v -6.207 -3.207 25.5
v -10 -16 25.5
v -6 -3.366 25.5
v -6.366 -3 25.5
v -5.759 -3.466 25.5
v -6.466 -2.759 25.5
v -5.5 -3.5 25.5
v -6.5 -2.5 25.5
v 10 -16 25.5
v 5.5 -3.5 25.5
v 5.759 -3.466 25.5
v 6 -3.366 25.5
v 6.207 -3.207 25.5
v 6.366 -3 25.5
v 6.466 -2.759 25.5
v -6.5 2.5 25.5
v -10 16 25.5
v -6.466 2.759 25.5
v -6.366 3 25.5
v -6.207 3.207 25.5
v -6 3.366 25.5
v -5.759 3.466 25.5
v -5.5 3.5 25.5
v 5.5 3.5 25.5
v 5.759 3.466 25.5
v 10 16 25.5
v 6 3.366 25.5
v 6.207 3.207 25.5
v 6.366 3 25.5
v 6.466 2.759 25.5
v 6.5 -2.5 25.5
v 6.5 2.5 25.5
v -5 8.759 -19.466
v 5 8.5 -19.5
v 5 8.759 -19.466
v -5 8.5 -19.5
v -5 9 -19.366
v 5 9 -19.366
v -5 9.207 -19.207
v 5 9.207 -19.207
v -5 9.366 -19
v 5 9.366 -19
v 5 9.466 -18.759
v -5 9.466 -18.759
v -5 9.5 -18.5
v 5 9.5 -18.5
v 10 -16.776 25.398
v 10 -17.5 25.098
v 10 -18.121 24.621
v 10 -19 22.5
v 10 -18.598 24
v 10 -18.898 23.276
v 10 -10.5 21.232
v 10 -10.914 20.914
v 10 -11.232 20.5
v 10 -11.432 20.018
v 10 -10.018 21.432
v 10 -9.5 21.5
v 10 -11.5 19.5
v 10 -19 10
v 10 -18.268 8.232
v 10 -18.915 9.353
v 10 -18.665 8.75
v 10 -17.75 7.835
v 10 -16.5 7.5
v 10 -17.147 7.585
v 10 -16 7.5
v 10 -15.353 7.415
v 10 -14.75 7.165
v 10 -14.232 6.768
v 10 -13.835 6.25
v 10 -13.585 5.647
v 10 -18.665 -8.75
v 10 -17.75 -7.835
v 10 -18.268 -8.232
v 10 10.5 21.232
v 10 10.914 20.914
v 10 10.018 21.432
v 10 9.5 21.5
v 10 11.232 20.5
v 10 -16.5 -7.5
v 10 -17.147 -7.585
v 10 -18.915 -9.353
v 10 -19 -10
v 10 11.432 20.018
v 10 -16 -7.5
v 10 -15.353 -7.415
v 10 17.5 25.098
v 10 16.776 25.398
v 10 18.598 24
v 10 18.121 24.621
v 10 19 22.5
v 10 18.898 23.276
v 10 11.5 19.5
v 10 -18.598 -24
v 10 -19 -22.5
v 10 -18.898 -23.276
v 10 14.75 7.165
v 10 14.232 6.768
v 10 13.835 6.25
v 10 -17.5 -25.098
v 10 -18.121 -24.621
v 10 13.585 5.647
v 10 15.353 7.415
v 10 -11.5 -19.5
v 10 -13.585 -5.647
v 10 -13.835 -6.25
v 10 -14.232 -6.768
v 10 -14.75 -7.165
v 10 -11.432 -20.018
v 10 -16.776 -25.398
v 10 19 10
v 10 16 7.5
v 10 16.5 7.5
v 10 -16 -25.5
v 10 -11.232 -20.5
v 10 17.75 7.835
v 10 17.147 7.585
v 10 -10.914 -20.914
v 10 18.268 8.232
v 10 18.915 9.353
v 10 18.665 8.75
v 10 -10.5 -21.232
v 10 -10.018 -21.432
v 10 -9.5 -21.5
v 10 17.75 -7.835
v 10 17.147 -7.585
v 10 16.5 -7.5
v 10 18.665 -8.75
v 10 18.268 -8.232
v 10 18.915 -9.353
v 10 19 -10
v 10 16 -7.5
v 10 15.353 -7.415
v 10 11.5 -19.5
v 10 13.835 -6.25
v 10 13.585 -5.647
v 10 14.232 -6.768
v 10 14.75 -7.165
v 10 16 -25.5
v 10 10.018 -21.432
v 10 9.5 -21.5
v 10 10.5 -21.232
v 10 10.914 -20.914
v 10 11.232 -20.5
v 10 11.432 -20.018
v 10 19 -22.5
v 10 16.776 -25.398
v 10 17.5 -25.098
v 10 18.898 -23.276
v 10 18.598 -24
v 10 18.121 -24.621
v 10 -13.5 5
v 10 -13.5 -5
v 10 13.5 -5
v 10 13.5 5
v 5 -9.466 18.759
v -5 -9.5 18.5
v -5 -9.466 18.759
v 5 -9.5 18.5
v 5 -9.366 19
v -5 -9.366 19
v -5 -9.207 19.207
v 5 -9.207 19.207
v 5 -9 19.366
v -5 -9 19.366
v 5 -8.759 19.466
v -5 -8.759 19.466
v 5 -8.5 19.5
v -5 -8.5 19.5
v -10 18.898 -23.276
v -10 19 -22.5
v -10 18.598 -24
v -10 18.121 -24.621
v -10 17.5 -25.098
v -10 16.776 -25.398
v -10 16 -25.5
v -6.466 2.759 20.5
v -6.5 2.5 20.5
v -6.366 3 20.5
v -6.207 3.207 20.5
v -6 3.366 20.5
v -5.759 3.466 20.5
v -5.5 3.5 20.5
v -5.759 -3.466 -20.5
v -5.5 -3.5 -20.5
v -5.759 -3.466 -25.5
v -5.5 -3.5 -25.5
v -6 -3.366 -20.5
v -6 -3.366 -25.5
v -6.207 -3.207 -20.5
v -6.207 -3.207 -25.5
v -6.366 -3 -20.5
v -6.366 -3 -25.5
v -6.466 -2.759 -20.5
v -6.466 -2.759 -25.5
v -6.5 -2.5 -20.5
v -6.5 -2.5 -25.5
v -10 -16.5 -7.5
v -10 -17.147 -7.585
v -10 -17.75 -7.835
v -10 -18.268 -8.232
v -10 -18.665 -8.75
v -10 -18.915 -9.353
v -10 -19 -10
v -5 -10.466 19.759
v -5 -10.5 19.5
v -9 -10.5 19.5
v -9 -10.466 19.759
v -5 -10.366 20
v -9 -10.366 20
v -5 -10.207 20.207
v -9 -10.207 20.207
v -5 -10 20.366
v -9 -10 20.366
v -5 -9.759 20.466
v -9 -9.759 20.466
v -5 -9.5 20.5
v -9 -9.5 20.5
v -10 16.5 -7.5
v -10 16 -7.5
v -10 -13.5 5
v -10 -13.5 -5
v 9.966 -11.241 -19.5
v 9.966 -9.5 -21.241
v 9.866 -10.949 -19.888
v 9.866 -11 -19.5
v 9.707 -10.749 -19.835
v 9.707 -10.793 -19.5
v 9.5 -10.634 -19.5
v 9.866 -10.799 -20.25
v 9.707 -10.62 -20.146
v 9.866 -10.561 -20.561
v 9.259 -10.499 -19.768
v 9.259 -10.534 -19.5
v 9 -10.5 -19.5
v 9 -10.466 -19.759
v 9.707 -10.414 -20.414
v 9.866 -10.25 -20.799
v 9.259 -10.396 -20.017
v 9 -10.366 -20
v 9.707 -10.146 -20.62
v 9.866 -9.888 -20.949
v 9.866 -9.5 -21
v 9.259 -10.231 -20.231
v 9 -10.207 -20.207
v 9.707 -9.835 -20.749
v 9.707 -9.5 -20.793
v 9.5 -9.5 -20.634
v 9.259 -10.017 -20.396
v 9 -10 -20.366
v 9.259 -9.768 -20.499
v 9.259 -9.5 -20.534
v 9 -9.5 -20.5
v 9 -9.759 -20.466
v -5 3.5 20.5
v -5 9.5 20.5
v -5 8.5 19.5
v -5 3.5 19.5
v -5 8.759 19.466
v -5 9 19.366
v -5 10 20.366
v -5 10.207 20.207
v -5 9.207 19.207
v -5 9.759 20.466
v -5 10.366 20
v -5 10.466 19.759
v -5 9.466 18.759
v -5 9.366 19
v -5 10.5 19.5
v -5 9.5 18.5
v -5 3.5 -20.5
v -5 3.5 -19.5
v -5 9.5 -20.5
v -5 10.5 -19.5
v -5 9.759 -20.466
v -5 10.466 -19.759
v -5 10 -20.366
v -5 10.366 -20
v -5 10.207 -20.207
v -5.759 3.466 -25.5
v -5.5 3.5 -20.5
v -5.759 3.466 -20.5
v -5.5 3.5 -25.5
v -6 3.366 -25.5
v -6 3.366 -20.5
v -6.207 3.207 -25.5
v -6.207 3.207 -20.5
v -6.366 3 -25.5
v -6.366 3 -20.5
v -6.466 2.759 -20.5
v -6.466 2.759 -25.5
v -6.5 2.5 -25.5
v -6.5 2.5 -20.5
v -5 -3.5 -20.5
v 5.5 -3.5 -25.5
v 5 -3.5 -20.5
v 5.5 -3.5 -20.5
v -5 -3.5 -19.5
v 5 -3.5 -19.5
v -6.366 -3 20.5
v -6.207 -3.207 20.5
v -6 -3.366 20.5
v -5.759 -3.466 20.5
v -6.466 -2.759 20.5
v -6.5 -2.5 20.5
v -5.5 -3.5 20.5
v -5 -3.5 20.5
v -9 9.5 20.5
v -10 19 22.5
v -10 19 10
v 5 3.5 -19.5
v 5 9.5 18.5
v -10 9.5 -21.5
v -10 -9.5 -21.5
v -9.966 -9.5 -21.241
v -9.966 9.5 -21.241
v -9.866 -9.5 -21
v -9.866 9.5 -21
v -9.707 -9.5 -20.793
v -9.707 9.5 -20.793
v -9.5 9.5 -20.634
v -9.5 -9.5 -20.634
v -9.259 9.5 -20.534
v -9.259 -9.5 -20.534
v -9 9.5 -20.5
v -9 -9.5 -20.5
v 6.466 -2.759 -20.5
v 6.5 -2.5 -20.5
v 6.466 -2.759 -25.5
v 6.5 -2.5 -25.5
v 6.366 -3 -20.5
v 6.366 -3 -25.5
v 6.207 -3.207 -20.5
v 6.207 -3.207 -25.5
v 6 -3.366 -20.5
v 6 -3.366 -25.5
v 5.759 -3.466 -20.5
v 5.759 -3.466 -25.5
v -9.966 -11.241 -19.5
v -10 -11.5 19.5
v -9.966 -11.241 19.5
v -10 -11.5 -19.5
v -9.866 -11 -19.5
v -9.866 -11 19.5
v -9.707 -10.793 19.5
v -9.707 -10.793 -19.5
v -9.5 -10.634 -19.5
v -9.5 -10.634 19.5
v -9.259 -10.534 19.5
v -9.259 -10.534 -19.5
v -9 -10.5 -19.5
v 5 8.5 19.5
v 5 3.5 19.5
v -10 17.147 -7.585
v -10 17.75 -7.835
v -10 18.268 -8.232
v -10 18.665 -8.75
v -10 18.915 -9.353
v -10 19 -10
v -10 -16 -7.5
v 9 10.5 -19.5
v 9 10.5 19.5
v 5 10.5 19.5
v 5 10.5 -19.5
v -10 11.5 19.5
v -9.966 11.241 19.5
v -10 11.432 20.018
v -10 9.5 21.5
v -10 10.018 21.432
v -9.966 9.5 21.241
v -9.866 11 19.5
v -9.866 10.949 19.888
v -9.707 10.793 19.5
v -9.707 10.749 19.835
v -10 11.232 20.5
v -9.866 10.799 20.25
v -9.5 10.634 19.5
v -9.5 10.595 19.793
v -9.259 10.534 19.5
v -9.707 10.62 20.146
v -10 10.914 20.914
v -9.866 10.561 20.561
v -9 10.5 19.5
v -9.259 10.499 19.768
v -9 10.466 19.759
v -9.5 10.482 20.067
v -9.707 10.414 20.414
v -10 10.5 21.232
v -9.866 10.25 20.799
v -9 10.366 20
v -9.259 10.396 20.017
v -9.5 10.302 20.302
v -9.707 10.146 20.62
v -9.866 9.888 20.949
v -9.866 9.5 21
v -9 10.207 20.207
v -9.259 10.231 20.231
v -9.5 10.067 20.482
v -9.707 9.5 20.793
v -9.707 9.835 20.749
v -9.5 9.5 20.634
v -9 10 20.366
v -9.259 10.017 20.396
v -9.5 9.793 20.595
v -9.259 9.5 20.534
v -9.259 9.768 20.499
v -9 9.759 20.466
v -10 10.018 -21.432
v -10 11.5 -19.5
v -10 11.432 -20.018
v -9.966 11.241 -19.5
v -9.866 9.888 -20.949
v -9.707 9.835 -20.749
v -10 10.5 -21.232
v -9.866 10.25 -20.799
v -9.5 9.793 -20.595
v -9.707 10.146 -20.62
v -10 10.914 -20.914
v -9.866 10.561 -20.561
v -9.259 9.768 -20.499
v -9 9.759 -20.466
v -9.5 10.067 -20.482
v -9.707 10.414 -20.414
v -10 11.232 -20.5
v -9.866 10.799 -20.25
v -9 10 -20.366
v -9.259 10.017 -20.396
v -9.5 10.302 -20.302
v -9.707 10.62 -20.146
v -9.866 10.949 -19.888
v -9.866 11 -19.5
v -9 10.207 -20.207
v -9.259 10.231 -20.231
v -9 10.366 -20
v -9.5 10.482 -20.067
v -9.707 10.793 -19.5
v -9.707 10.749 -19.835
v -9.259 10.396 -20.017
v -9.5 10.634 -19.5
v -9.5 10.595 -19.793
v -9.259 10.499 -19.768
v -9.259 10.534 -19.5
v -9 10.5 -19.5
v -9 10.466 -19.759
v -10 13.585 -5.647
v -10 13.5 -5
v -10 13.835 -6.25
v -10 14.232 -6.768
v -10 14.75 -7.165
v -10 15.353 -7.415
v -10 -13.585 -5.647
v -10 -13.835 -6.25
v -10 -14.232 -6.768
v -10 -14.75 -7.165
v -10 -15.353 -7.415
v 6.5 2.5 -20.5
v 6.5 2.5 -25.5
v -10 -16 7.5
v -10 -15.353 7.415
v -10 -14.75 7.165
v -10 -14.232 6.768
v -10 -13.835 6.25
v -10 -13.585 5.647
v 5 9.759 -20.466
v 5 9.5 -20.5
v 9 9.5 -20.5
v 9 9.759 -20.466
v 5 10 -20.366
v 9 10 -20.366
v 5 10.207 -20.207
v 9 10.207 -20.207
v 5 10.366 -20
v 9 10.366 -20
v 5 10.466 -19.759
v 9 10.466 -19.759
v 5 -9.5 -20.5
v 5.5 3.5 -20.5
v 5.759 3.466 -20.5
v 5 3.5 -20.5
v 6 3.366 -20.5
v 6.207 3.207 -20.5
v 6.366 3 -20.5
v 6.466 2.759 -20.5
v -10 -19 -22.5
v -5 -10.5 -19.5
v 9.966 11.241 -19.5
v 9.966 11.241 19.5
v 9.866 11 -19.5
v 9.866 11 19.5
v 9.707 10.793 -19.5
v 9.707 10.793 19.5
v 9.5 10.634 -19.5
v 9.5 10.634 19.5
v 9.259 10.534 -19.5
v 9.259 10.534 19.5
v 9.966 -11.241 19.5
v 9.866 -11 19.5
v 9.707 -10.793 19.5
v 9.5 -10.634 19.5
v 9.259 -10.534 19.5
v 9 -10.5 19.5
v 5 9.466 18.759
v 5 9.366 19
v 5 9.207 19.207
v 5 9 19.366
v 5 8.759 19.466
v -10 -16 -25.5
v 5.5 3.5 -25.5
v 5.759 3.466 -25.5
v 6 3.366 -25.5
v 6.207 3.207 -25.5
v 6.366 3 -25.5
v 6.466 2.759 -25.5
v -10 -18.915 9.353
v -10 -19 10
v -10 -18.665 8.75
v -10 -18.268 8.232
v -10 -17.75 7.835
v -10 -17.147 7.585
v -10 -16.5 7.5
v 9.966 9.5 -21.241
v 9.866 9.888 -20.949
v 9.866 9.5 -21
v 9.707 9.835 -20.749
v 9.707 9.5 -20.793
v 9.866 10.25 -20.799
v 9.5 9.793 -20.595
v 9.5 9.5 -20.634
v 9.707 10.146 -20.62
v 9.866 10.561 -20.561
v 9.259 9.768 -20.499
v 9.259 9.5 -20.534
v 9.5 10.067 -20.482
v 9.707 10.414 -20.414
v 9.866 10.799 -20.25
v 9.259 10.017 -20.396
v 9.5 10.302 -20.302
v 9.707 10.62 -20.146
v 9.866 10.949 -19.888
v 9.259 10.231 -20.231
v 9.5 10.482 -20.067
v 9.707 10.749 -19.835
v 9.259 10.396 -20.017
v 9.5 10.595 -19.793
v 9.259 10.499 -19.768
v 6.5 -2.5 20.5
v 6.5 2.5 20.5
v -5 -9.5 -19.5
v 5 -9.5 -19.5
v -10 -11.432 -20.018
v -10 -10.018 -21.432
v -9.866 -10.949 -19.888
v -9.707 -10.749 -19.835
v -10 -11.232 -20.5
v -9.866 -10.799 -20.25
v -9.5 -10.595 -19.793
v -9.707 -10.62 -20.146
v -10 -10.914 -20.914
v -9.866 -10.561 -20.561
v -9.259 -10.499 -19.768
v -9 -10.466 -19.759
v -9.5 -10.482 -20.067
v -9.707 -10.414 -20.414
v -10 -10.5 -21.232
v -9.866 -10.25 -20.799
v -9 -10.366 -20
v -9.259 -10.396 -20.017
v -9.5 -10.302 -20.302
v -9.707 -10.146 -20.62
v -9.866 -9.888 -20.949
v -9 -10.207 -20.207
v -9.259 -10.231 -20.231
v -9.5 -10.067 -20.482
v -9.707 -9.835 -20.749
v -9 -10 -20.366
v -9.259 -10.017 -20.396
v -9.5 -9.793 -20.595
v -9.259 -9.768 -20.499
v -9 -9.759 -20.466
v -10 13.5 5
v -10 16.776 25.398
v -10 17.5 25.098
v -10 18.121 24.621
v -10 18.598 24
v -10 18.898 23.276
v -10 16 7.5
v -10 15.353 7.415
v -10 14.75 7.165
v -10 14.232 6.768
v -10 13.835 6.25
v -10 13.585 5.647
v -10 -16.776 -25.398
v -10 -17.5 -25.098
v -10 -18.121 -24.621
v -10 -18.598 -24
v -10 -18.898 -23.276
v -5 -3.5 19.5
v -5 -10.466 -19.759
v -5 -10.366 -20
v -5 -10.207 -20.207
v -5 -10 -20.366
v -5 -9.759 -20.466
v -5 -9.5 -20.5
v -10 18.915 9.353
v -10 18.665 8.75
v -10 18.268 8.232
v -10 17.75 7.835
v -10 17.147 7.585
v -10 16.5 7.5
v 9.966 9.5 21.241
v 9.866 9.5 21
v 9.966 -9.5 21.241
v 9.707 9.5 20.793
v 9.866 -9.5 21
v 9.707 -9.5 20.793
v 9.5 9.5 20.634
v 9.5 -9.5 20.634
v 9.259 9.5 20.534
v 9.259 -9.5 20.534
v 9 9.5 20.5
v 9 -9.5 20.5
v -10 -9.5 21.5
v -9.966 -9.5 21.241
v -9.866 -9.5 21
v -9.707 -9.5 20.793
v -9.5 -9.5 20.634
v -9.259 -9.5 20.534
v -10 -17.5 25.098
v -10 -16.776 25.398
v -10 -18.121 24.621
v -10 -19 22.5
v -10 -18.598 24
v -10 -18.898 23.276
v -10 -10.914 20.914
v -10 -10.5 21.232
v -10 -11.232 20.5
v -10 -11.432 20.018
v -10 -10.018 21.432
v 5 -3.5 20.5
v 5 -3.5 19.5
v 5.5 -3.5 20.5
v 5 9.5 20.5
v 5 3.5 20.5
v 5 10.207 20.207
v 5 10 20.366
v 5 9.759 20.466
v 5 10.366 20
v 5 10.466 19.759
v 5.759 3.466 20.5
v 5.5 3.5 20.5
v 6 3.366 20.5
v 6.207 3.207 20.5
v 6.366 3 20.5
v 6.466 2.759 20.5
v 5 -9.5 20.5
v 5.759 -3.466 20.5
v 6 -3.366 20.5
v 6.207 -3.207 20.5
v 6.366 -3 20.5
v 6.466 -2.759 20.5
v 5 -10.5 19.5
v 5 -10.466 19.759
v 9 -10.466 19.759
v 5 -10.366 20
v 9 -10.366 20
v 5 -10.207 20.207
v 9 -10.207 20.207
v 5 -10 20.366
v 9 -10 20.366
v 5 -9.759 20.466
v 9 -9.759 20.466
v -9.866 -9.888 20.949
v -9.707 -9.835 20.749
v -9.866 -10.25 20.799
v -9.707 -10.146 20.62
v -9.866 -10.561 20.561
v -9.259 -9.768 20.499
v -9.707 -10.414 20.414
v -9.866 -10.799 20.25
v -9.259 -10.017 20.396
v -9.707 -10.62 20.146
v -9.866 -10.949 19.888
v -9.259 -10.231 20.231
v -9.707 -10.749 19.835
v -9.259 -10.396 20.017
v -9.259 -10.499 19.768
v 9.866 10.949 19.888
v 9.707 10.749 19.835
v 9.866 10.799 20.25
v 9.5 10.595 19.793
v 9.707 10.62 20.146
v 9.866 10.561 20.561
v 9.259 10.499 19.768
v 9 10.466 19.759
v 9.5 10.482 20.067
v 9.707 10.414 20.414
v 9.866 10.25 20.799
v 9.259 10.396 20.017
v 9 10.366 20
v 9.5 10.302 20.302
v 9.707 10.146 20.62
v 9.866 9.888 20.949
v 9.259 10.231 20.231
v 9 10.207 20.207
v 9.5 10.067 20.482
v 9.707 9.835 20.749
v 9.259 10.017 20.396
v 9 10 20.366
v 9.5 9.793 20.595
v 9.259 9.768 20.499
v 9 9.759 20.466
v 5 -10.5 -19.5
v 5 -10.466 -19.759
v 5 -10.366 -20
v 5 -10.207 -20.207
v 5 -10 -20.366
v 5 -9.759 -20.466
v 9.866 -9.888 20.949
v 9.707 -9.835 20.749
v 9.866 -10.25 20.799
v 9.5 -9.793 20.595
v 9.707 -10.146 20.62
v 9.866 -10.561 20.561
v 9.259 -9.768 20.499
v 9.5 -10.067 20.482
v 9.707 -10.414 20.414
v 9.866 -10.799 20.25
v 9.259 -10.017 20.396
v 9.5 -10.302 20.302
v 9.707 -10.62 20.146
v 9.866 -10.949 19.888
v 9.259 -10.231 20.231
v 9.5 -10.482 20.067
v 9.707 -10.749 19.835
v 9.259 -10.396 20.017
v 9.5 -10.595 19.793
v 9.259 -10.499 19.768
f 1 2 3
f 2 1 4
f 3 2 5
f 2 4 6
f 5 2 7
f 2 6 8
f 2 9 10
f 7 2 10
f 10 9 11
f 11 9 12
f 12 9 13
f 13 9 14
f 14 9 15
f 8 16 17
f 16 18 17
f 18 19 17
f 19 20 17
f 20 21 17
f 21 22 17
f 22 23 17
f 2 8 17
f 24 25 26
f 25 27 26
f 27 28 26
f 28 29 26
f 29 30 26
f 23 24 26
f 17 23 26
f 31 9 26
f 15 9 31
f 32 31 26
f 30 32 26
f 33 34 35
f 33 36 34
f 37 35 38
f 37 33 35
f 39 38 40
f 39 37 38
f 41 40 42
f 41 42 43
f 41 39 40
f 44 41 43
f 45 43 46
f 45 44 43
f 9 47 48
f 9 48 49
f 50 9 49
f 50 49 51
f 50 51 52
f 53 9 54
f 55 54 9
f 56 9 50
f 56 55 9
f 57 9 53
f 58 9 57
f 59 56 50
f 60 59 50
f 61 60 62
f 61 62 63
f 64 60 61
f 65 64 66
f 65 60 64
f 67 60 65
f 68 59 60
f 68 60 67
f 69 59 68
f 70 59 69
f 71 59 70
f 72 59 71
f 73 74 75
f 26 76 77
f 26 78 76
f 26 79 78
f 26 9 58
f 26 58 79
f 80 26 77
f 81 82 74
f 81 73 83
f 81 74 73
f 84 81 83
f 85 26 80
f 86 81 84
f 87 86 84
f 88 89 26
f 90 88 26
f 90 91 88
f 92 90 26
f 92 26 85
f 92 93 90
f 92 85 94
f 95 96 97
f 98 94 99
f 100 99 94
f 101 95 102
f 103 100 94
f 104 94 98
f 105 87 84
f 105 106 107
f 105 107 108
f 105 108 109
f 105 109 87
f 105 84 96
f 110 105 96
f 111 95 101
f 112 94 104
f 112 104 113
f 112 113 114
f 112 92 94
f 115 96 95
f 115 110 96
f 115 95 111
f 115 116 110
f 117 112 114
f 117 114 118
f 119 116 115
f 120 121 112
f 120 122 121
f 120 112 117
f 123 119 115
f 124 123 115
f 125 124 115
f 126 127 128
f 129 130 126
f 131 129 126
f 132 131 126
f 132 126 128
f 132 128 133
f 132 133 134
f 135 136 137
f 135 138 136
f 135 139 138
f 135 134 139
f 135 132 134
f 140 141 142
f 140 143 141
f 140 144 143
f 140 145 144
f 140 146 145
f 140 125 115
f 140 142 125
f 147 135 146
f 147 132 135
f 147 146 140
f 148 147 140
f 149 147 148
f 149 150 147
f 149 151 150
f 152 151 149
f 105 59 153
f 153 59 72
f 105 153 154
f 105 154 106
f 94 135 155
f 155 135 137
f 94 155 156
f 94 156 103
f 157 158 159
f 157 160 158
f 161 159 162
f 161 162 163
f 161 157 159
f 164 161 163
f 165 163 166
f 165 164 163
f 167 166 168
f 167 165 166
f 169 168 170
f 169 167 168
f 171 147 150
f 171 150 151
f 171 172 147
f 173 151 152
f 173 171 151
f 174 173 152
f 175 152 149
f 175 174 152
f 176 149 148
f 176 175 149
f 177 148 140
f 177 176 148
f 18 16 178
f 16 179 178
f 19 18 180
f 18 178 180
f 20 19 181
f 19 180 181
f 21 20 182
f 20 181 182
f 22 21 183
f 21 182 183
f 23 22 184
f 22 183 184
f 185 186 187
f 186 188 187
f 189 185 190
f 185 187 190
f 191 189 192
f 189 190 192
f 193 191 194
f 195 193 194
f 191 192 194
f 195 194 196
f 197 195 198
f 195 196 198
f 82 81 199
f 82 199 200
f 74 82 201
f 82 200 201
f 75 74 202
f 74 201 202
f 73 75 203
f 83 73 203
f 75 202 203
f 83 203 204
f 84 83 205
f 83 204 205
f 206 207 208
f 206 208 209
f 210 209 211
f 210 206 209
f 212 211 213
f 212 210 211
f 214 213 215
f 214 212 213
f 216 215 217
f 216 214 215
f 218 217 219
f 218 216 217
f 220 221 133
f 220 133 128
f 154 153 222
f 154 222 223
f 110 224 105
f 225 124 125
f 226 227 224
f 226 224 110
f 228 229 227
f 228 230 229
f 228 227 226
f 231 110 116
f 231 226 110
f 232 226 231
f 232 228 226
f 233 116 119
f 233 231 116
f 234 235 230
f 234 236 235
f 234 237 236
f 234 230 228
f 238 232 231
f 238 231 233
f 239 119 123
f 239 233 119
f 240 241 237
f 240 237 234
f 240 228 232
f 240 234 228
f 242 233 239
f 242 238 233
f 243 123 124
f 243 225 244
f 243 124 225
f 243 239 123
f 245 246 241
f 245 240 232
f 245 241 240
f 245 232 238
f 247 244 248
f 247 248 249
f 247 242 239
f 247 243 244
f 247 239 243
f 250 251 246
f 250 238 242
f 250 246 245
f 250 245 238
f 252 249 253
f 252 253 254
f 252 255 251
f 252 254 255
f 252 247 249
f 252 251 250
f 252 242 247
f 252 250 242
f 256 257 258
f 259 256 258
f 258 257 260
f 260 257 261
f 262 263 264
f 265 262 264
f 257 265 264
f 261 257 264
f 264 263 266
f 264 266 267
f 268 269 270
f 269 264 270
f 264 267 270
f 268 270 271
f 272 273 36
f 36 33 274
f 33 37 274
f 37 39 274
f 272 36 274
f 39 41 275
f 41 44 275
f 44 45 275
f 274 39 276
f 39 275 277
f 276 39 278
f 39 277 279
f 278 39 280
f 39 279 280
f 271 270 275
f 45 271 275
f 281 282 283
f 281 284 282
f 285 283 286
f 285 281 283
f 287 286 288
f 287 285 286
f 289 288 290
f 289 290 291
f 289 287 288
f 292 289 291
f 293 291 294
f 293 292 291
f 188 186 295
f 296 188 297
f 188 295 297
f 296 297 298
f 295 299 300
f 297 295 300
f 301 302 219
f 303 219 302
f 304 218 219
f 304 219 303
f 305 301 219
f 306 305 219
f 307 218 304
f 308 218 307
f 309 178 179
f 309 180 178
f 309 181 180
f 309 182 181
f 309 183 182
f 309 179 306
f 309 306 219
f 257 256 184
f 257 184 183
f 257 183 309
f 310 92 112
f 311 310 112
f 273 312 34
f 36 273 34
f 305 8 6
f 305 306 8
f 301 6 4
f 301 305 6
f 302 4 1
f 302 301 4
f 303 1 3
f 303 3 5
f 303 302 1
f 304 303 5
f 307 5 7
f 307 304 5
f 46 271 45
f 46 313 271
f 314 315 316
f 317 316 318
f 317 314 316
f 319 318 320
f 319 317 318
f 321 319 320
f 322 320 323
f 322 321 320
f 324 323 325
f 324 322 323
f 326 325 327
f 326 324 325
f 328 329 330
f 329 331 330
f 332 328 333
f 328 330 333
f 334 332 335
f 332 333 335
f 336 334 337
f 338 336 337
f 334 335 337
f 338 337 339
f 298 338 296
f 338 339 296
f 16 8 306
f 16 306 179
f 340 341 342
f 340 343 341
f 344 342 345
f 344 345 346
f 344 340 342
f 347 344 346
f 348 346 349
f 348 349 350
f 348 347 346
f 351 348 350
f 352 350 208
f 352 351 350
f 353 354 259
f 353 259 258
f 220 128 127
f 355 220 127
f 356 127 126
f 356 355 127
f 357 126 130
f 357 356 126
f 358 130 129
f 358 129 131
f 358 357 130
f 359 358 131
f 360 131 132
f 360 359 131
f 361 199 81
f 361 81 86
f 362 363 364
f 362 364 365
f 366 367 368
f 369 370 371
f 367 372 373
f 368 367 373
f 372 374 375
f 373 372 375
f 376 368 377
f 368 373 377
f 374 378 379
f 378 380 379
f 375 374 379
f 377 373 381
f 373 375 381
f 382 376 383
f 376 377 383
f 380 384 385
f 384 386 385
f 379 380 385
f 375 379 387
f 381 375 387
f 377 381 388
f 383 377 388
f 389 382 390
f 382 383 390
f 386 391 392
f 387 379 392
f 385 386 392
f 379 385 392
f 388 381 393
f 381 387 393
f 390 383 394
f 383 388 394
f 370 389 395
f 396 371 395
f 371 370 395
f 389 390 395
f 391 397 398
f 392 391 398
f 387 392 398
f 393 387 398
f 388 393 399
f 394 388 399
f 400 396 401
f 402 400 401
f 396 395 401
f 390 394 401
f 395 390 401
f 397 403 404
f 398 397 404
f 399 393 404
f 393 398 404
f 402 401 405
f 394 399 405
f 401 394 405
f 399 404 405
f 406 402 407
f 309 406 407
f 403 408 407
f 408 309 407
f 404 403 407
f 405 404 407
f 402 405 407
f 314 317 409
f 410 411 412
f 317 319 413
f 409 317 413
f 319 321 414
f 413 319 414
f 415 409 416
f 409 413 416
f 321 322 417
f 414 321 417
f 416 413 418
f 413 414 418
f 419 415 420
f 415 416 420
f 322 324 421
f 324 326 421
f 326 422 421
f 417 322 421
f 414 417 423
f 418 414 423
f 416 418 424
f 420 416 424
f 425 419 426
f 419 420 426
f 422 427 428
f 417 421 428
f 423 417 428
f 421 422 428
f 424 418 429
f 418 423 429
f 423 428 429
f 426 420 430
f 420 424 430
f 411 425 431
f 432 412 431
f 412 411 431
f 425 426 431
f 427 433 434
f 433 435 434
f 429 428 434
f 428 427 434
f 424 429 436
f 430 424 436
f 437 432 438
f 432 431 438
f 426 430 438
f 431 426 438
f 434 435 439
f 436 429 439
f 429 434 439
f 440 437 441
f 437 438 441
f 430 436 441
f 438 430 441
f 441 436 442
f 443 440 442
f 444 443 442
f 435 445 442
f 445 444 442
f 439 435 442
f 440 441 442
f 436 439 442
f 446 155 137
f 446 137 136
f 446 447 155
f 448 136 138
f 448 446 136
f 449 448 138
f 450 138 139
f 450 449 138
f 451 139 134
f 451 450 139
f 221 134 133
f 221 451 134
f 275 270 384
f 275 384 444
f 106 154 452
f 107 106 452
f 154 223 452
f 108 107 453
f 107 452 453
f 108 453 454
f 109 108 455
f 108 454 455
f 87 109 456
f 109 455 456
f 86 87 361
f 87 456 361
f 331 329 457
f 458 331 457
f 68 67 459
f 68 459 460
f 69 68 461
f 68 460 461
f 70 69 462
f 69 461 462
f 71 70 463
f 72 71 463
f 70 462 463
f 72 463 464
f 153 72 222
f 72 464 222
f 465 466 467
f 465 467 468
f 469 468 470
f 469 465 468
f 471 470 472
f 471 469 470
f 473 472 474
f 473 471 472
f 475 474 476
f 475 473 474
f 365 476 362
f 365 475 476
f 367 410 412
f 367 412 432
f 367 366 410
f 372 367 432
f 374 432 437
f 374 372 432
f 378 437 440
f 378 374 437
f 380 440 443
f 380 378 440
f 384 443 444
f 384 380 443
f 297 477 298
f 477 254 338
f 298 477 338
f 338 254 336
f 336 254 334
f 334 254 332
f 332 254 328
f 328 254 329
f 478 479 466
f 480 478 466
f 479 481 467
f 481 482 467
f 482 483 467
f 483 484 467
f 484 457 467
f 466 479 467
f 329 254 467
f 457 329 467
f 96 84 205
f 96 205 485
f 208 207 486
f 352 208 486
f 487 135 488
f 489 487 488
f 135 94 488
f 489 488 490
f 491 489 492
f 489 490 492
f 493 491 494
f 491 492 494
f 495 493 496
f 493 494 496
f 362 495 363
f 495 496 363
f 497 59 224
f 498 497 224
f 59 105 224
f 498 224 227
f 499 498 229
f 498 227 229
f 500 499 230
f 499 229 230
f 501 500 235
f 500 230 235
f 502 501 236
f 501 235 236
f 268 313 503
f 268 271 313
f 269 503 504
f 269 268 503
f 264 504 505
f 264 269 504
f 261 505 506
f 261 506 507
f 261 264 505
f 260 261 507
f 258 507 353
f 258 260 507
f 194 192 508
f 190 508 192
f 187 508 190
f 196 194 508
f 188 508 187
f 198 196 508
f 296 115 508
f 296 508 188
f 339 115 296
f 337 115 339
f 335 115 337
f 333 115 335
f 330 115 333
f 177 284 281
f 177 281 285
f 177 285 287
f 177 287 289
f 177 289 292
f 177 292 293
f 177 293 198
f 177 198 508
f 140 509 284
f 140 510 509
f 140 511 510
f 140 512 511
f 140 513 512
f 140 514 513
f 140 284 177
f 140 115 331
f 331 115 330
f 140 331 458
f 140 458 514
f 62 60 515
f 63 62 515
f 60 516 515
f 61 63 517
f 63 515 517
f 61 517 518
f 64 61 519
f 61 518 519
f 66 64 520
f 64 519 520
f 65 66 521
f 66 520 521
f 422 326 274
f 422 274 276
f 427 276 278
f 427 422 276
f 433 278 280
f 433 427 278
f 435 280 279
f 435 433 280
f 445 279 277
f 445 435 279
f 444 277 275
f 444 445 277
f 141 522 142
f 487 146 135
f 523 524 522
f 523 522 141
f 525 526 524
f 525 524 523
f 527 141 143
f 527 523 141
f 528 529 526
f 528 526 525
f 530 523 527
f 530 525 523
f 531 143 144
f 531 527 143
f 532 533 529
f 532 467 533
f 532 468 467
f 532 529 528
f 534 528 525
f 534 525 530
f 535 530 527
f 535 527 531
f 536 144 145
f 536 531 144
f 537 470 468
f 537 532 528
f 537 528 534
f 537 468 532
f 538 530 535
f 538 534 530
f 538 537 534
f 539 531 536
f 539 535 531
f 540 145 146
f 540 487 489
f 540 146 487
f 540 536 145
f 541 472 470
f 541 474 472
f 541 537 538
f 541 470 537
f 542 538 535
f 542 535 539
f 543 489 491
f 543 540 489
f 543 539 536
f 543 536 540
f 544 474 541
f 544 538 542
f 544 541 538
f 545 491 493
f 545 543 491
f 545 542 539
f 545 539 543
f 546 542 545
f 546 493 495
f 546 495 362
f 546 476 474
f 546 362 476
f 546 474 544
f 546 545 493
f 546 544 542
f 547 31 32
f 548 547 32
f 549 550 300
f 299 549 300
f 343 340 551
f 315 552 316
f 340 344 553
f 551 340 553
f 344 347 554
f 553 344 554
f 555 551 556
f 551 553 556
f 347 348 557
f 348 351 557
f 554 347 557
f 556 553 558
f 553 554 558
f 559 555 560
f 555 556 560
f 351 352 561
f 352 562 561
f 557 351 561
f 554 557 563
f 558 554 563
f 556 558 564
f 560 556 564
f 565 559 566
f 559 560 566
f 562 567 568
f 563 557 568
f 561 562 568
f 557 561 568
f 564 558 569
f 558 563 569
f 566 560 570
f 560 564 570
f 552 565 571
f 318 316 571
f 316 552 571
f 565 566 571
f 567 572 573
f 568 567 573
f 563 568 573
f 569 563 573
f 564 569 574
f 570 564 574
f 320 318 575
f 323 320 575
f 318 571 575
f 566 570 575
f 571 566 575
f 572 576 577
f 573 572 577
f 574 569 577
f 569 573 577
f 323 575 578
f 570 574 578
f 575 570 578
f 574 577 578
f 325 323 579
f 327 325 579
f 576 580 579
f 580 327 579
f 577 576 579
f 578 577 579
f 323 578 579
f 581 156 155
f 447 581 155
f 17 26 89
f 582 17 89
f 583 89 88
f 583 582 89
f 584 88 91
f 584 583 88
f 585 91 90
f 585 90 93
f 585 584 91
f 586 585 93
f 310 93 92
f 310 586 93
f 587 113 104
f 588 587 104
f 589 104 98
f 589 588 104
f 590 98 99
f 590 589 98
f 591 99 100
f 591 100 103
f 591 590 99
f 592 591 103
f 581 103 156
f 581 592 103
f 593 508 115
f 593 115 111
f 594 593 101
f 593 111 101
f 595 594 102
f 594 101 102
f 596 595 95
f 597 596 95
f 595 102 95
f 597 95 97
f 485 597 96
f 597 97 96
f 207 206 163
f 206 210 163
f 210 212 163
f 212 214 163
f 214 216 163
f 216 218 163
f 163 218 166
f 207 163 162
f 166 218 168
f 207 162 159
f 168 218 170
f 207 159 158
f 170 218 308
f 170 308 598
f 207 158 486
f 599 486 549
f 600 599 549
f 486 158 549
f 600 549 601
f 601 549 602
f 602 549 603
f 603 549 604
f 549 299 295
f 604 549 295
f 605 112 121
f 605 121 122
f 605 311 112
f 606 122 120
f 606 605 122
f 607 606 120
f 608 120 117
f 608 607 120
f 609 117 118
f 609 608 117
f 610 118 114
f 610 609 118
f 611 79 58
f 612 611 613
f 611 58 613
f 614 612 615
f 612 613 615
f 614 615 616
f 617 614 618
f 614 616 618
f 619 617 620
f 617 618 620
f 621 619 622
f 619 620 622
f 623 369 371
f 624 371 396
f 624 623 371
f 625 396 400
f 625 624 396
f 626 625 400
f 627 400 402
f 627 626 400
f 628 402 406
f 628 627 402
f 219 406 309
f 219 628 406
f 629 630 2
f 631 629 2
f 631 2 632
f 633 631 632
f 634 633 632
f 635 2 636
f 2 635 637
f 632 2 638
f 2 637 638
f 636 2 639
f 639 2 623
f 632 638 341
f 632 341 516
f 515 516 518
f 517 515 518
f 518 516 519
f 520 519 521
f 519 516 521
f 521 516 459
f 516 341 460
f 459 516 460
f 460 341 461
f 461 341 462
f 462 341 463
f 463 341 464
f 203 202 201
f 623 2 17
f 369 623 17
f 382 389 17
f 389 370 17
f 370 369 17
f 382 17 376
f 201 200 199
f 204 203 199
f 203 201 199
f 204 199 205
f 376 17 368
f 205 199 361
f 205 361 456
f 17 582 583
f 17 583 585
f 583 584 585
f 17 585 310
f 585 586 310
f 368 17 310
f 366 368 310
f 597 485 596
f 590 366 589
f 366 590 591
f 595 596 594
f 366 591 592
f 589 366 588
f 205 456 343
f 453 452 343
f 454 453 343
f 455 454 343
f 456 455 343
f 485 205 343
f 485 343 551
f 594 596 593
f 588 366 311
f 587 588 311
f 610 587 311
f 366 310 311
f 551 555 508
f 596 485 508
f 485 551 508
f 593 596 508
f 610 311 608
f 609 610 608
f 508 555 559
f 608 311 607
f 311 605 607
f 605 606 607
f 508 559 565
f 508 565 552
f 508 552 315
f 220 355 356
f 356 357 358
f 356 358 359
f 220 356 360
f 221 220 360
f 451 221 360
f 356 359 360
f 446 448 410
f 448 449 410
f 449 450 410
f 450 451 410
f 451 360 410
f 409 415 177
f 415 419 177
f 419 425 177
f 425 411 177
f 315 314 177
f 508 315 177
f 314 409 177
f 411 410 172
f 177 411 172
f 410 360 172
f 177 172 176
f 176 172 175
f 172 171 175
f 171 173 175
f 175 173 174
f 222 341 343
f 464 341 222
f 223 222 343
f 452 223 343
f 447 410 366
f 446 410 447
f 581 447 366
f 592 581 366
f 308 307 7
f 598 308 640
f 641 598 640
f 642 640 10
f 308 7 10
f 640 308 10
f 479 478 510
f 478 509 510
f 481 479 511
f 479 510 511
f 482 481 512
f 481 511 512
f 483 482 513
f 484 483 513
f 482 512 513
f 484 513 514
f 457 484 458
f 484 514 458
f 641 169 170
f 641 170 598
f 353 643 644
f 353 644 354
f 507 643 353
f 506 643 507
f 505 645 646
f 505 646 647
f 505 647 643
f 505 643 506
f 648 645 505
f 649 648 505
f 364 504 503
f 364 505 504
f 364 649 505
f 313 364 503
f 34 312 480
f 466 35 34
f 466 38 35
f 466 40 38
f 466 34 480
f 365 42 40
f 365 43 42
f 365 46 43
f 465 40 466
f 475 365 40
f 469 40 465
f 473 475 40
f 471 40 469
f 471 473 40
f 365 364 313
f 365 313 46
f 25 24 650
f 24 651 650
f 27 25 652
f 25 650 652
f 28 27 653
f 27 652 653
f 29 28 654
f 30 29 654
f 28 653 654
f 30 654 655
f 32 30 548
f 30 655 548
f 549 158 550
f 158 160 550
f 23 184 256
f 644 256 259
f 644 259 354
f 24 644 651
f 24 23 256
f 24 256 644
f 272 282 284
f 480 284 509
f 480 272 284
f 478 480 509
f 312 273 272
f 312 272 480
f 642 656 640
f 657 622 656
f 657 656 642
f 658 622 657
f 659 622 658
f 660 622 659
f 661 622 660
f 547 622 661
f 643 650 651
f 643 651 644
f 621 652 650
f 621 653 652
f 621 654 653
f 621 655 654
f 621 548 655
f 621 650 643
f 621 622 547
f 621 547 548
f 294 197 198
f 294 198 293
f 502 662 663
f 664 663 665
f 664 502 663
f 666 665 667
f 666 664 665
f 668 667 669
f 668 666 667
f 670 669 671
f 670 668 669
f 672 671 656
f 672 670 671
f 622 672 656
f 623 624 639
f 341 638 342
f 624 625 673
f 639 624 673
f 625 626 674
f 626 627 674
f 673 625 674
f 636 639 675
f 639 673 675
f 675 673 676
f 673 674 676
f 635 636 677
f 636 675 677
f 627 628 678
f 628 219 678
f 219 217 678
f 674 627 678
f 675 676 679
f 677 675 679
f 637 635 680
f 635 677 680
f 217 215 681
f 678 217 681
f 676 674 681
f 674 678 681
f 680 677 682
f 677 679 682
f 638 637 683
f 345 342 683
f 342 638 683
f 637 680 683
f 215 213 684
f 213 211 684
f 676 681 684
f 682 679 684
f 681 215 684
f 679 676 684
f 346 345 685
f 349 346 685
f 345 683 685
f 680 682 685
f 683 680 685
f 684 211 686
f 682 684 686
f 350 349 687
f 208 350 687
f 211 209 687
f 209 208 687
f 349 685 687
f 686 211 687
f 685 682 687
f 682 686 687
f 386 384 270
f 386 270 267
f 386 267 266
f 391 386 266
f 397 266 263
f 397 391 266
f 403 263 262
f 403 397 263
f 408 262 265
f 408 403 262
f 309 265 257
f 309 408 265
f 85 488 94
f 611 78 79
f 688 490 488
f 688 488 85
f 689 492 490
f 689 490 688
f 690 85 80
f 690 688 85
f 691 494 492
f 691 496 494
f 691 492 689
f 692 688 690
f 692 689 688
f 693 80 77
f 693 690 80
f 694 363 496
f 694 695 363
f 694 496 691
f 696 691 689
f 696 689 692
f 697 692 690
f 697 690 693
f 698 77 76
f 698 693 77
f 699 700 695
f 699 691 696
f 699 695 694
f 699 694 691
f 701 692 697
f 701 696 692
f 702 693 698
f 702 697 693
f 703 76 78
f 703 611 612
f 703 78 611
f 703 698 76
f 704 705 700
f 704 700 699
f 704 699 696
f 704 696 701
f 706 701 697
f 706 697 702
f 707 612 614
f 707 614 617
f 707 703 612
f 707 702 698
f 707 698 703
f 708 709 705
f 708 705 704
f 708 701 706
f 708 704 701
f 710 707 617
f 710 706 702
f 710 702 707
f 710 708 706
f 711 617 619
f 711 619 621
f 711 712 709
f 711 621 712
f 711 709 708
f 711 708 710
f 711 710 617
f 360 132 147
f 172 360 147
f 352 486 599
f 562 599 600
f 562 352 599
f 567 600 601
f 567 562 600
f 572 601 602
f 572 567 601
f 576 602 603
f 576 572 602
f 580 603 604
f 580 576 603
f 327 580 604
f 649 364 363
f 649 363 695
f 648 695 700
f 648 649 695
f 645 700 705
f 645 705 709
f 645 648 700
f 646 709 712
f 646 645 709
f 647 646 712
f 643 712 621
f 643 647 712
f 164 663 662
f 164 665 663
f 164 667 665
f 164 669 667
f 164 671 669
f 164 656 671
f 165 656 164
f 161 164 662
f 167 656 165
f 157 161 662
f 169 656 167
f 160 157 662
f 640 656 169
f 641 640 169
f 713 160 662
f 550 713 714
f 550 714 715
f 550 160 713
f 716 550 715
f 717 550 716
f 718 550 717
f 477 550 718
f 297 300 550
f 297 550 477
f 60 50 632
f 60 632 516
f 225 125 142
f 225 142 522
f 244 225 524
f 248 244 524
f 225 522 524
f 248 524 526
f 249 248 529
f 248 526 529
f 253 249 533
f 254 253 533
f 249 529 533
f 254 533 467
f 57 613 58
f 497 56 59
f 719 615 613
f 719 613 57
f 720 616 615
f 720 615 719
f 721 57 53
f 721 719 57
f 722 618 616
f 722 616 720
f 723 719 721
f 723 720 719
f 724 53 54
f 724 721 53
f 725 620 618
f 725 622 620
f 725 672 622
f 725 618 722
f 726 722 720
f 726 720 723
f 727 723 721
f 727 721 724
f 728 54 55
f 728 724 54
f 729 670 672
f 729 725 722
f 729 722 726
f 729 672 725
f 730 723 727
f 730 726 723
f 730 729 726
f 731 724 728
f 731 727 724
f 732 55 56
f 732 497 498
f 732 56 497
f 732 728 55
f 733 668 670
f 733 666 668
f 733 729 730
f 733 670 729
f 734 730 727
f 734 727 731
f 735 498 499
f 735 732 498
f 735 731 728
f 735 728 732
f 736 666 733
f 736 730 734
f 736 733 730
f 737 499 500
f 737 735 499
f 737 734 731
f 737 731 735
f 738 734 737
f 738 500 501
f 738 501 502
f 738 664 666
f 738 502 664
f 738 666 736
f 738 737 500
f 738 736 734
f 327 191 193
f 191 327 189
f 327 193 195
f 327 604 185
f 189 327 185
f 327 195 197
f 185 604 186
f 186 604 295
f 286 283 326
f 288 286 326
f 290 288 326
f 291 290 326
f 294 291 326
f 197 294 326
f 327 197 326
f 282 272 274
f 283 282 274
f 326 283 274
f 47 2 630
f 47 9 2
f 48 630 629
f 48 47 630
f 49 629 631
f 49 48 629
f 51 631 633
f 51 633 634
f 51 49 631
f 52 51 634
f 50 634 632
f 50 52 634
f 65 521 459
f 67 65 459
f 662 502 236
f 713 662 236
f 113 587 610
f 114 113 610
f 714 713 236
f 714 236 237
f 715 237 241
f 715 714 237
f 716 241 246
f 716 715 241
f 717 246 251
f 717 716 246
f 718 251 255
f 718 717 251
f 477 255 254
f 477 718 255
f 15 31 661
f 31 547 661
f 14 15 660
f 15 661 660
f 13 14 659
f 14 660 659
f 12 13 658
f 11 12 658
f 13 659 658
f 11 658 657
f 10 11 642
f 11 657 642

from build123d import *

# Parameters (mm, degrees)
SKETCH1_W                   = 51
SKETCH1_H                   = 38
SKETCH1_W_2                 = 41
SKETCH1_H_2                 = 21
MAIN_BODY_DEPTH             = 10
SKETCH2_W                   = 41
SKETCH2_H                   = 21
SKETCH2_W_2                 = 39
SKETCH2_H_2                 = 19
MID_SERVO_GAP_DEPTH         = 5
EDGE_CONTOURING_R           = 1
SKETCH3_W                   = 13
SKETCH3_H                   = 7
AIRWAY_DEPTH                = 52
SKETCH4_W                   = 15
SKETCH4_H                   = 5.5
CLEARANCE_CABLES_DEPTH      = 21
CONTOURING_OUTER_R          = 3
CONTOURING_AIRWAY_R         = 1
CONTOURING_INNER_R          = 2.5
CLEARANCE_SERVO_INSERTION_R = 1


with BuildPart() as part:
    # Sketch1 → Main Body (new body, symmetric)
    with BuildSketch(Plane(origin=(0, 0, 0), x_dir=(0, 0, -1), z_dir=(1, 0, 0))):
        Rectangle(SKETCH1_W, SKETCH1_H)
        Rectangle(SKETCH1_W_2, SKETCH1_H_2, mode=Mode.SUBTRACT)
    extrude(amount=MAIN_BODY_DEPTH, both=True)

    # Sketch2 → Mid Servo Gap (add, symmetric)
    with BuildSketch(Plane(origin=(0, 0, 0), x_dir=(0, 0, -1), z_dir=(1, 0, 0))):
        Rectangle(SKETCH2_W, SKETCH2_H)
        Rectangle(SKETCH2_W_2, SKETCH2_H_2, mode=Mode.SUBTRACT)
    extrude(amount=MID_SERVO_GAP_DEPTH, both=True)

    # Edge Contouring
    edge_contouring_edges = [part.edges().sort_by_distance(p)[0] for p in [
        (7.5, 10.5, 20.5),
        (7.5, -10.5, 20.5),
        (7.5, -10.5, -20.5),
        (7.5, 10.5, -20.5),
        (-7.5, 10.5, -20.5),
        (-7.5, 10.5, 20.5),
        (-7.5, -10.5, -20.5),
        (-7.5, -10.5, 20.5),
        (0, 9.5, 19.5),
        (0, -9.5, 19.5),
        (0, 9.5, -19.5),
    ]]
    fillet(edge_contouring_edges, radius=EDGE_CONTOURING_R)

    # Sketch3 → Airway (cut, through all)
    with BuildSketch(Plane.XY.offset(25.5)):
        Rectangle(SKETCH3_W, SKETCH3_H)
    extrude(amount=-AIRWAY_DEPTH, mode=Mode.SUBTRACT)

    # Sketch4 → Clearance - Cables (cut, through all)
    with BuildSketch(Plane(origin=(10, 0, 0), x_dir=(0, 0, -1), z_dir=(1, 0, 0))):
        with Locations((0, 16.25)):
            Rectangle(SKETCH4_W, SKETCH4_H)
        with Locations((0, -16.25)):
            Rectangle(SKETCH4_W, SKETCH4_H)
    extrude(amount=-CLEARANCE_CABLES_DEPTH, mode=Mode.SUBTRACT)

    # Contouring - Outer
    contouring_outer_edges = [part.edges().sort_by_distance(p)[0] for p in [
        (0, 19, 25.5),
        (0, 19, -25.5),
        (0, -19, -25.5),
        (0, -19, 25.5),
    ]]
    fillet(contouring_outer_edges, radius=CONTOURING_OUTER_R)

    # Contouring - Airway
    contouring_airway_edges = [part.edges().sort_by_distance(p)[0] for p in [
        (-6.5, -3.5, 23),
        (6.5, 3.5, 23),
        (-6.5, 3.5, 23),
        (6.5, -3.5, 23),
        (-6.5, -3.5, -23),
        (-6.5, 3.5, -23),
        (6.5, 3.5, -23),
        (6.5, -3.5, -23),
    ]]
    fillet(contouring_airway_edges, radius=CONTOURING_AIRWAY_R)

    # Contouring - Inner
    contouring_inner_edges = [part.edges().sort_by_distance(p)[0] for p in [
        (0, 13.5, 7.5),
        (0, 19, 7.5),
        (0, 19, -7.5),
        (0, 13.5, -7.5),
        (0, -19, -7.5),
        (0, -19, 7.5),
        (0, -13.5, 7.5),
        (0, -13.5, -7.5),
    ]]
    fillet(contouring_inner_edges, radius=CONTOURING_INNER_R)

    # Clearance - Servo Insertion
    clearance_servo_insertion_edges = [part.edges().sort_by_distance(p)[0] for p in [
        (-10, -10.5, 0),
        (-10, 0, -20.5),
        (-10, 0, 20.5),
        (10, 0, -20.5),
        (10, 10.5, 0),
        (-10, 10.5, 0),
        (10, 0, 20.5),
        (10, -10.5, 0),
        (-10, -10.207106781, -20.207106781),
        (-10, -10.207106781, 20.207106781),
        (10, 10.207106781, -20.207106781),
        (-10, 10.207106781, -20.207106781),
        (-10, 10.207106781, 20.207106781),
        (10, 10.207106781, 20.207106781),
        (10, -10.207106781, 20.207106781),
        (10, -10.207106781, -20.207106781),
    ]]
    fillet(clearance_servo_insertion_edges, radius=CLEARANCE_SERVO_INSERTION_R)


solid = part.part
